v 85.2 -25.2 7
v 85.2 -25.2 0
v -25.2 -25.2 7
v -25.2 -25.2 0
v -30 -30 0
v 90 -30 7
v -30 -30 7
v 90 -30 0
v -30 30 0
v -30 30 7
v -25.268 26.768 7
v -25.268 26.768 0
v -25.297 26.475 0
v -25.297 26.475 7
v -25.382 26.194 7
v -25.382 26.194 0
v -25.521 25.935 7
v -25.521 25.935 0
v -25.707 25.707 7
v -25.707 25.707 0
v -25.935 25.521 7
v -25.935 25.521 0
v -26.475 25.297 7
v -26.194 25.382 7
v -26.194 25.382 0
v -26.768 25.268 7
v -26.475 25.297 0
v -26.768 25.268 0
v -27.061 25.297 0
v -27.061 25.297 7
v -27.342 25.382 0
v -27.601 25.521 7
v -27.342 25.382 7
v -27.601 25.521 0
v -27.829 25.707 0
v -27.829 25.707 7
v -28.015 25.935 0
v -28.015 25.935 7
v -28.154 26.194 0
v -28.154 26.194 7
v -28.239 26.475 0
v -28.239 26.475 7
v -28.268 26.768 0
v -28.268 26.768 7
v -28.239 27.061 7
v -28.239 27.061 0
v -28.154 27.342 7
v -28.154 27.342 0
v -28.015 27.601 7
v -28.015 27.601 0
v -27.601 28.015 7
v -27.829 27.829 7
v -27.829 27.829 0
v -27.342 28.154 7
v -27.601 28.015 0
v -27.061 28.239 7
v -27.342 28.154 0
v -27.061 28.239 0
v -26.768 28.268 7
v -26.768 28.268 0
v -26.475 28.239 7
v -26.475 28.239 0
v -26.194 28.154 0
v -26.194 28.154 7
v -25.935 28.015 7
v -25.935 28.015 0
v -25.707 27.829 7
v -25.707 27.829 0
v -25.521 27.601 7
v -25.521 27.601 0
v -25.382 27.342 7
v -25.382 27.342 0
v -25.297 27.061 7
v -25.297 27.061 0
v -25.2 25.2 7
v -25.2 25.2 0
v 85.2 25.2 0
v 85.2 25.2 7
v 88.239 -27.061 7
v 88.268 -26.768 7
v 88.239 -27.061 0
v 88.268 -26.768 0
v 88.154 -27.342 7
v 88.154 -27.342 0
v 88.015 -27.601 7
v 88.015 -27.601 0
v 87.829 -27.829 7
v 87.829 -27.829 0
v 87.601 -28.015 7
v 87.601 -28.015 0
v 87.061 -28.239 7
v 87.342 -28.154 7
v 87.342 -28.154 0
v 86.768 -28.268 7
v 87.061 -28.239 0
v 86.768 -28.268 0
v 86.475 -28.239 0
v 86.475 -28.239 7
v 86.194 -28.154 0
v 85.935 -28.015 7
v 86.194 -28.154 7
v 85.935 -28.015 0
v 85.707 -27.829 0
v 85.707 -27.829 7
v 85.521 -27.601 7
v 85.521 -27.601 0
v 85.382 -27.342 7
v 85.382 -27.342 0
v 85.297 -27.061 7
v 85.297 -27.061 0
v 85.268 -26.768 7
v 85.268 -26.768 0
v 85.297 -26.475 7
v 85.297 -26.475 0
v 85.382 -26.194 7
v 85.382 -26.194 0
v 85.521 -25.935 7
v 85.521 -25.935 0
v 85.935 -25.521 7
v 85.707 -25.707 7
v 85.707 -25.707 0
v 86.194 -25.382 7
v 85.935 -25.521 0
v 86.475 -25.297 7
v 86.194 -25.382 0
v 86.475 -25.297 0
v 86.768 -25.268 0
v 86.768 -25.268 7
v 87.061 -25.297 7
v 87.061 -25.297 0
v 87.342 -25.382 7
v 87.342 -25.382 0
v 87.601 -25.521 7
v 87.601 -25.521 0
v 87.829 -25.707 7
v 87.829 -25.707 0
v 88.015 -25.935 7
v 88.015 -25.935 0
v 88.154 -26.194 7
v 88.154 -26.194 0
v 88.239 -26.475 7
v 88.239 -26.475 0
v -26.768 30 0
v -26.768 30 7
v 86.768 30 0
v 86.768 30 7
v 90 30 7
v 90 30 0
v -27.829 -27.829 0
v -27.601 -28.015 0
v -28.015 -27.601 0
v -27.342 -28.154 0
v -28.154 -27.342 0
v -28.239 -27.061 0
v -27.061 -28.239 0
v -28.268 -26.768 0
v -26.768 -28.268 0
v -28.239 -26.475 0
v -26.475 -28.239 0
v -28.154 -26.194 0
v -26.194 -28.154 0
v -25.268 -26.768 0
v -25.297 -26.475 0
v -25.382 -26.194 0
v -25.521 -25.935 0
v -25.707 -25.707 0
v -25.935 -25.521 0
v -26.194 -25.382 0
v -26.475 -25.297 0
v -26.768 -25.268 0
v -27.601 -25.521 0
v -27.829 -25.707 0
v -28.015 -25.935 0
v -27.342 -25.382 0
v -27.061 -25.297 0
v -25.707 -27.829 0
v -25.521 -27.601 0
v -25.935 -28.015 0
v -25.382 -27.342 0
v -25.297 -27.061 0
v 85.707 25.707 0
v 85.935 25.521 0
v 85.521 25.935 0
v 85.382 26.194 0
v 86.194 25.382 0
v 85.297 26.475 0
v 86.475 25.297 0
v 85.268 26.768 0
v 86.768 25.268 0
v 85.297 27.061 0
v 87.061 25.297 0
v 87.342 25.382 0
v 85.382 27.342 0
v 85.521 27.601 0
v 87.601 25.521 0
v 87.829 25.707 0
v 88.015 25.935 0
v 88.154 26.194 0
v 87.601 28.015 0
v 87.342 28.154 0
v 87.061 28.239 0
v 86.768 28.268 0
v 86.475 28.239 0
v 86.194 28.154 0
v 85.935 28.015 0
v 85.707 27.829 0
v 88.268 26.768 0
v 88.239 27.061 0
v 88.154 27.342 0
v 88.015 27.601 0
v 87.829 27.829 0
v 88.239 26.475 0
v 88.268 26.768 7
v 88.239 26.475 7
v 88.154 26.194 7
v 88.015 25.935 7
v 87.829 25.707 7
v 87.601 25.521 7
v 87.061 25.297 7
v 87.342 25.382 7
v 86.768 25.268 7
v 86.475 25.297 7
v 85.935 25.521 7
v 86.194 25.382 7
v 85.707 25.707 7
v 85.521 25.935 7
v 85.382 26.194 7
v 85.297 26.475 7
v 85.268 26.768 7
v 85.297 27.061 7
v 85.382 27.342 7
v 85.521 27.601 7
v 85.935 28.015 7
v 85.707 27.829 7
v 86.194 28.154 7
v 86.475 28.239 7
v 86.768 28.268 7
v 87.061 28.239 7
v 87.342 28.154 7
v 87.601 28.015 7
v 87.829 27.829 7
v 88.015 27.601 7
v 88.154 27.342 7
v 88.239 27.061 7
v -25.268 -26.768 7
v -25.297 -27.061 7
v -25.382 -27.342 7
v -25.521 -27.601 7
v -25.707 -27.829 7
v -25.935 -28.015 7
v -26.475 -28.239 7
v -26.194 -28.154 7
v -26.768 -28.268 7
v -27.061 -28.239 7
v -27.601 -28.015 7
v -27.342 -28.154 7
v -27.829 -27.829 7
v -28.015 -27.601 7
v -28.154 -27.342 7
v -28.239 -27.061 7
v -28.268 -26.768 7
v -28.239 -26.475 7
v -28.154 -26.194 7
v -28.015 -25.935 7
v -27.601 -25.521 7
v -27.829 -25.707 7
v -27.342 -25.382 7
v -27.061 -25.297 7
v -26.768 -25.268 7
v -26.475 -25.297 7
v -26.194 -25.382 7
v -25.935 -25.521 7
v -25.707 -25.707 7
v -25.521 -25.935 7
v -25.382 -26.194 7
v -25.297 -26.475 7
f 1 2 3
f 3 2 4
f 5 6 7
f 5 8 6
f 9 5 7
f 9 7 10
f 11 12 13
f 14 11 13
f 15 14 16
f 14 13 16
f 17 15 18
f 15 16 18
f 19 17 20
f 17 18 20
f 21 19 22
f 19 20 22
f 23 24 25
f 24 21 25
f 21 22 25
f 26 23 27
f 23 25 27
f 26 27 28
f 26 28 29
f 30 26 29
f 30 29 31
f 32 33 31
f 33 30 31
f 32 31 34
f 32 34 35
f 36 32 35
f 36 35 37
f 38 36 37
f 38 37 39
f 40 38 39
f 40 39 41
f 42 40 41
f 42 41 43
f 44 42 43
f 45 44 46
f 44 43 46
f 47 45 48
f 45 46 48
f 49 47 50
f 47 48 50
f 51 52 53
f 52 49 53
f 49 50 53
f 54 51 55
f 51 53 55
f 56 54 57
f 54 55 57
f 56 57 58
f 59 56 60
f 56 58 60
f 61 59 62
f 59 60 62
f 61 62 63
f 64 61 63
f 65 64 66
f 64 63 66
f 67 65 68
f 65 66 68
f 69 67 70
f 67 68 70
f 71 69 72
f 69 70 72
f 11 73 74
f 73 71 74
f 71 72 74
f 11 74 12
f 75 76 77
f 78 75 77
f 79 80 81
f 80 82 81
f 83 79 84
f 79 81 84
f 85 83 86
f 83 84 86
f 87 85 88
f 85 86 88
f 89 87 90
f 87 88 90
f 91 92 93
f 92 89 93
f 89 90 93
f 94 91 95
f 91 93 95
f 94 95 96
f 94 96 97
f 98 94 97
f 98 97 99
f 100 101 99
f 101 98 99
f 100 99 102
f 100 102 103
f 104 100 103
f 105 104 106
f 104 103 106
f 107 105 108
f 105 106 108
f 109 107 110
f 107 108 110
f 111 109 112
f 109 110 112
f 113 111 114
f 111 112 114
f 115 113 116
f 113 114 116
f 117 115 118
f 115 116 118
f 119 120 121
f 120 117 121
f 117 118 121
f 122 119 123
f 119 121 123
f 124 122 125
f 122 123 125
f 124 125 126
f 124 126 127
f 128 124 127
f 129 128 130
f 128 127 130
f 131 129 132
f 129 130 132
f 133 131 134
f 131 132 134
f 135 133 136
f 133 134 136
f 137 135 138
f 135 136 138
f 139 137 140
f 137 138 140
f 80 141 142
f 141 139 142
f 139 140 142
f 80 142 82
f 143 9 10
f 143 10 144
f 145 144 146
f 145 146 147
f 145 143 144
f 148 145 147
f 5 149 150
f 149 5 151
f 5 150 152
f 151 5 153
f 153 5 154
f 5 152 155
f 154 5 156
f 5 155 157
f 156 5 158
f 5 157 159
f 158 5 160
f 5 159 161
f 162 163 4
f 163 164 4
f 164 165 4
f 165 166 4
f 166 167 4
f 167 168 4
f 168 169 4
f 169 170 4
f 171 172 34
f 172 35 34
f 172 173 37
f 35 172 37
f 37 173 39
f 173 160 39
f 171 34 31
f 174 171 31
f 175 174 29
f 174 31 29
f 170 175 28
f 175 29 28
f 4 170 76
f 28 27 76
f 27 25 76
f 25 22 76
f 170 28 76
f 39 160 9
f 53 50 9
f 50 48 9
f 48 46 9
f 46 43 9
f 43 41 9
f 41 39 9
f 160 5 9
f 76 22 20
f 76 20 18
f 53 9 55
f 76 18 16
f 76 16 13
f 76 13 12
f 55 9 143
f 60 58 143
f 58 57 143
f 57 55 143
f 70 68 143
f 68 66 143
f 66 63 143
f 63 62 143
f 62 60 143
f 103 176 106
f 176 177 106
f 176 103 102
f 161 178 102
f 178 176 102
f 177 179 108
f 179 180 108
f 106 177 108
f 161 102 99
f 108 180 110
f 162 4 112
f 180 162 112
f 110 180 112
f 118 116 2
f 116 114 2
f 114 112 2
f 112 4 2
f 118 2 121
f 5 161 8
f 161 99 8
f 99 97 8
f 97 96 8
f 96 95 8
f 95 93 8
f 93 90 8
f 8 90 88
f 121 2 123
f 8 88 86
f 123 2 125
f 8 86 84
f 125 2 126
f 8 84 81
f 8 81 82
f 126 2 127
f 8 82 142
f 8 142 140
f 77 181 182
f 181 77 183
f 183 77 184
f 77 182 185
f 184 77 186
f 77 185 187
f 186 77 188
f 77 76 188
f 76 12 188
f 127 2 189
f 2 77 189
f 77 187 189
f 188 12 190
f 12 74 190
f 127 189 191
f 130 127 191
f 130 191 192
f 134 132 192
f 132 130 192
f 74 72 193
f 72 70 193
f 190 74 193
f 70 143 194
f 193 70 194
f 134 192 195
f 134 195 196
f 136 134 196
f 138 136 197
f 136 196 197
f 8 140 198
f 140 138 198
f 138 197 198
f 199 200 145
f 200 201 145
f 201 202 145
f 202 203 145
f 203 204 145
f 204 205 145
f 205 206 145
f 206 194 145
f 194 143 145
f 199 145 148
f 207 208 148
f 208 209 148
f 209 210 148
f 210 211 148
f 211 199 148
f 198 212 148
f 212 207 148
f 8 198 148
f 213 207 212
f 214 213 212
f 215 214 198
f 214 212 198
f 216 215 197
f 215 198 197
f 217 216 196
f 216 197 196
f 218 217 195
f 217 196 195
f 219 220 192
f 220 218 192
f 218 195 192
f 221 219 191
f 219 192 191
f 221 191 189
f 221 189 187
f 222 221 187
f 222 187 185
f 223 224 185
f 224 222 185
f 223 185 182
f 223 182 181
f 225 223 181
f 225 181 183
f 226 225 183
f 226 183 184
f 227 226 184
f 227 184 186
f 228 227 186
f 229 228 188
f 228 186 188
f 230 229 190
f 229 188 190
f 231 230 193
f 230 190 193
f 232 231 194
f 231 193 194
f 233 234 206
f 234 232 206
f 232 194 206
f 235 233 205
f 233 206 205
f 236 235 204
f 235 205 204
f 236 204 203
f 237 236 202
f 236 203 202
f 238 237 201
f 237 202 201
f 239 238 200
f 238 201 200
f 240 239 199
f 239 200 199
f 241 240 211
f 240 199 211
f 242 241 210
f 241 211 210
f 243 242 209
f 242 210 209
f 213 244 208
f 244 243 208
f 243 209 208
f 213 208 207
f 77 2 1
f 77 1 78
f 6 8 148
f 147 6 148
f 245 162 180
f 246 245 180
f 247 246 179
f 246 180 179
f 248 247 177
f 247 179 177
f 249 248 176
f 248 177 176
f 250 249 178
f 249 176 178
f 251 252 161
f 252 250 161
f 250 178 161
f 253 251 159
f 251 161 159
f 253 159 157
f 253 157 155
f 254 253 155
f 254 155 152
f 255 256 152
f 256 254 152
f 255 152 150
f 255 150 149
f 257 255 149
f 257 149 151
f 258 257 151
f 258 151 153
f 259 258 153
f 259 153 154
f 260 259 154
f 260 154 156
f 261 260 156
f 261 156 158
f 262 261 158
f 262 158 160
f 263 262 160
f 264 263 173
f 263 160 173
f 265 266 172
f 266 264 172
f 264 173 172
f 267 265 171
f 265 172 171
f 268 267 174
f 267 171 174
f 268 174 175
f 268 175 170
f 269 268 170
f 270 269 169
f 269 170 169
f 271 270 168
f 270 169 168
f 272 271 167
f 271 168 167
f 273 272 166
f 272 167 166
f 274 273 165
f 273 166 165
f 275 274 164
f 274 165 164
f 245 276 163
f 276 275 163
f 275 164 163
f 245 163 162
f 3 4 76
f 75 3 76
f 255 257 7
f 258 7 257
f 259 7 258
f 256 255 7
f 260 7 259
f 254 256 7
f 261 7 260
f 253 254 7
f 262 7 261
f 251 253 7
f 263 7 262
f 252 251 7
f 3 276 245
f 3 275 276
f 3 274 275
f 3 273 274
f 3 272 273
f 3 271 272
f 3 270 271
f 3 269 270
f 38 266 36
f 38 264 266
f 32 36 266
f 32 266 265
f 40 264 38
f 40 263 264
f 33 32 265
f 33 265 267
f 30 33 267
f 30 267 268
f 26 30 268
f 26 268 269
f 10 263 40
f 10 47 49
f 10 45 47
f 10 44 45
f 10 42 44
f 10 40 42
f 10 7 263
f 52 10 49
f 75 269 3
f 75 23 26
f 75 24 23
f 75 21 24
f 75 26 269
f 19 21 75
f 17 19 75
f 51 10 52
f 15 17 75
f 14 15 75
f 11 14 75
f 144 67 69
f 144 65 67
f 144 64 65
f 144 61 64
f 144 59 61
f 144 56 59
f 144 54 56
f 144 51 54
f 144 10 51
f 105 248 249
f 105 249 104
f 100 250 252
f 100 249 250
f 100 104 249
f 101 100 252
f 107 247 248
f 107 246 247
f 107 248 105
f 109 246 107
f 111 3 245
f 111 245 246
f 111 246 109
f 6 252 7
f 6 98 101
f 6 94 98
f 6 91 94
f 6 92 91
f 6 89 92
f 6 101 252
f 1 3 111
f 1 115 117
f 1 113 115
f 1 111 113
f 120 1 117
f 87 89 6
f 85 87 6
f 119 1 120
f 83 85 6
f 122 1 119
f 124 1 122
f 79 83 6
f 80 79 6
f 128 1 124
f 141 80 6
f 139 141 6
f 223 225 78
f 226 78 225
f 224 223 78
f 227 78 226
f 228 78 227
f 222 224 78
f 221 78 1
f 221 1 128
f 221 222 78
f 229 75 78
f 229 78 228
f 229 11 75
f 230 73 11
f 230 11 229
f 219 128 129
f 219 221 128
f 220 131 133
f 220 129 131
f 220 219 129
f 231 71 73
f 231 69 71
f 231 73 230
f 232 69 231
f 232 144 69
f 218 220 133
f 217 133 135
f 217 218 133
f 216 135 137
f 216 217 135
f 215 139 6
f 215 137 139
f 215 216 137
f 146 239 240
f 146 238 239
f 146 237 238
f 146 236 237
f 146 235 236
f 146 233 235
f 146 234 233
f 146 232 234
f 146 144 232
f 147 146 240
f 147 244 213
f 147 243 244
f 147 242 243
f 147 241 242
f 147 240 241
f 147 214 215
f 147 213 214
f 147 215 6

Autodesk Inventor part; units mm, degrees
ref_plane "YZ Plane" through (0, 0, 0) normal (1, 0, 0) x (0, 1, 0)
ref_plane "XZ Plane" through (0, 0, 0) normal (0, 1, 0) x (-1, 0, 0)
ref_plane "XY Plane" through (0, 0, 0) normal (0, 0, 1) x (1, 0, 0)
sketch "Sketch1" plane through (0, 0, 0) normal (0, 0, 1) x (1, 0, 0)
  line L0 (-25.2, 25.2) -> (25.2, 25.2)
  line L1 (25.2, 25.2) -> (25.2, -25.2)
  line L2 (25.2, -25.2) -> (-25.2, -25.2)
  line L3 (-25.2, -25.2) -> (-25.2, 25.2)
  line L4 (-25.2, 25.2) -> (25.2, -25.2) construction
  line L5 (25.2, 25.2) -> (-25.2, -25.2) construction
  line L6 (-30, 30) -> (30, 30)
  line L7 (30, 30) -> (30, -30)
  line L8 (30, -30) -> (-30, -30)
  line L9 (-30, -30) -> (-30, 30)
  line L10 (-30, 30) -> (30, -30) construction
  line L11 (30, 30) -> (-30, -30) construction
  line L12 (-30, 30) -> (-26.768, 30)
  line L13 (-26.768, 30) -> (-26.768, 26.768)
  circle A0 centre (-26.768, 26.768) radius 1.5
  circle A1 centre (-26.768, -26.768) radius 1.5
  circle A2 centre (26.768, -26.768) radius 1.5
  circle A3 centre (26.768, 26.768) radius 1.5
  line L14 (85.2, 25.2) -> (34.8, 25.2)
  line L15 (34.8, 25.2) -> (34.8, -25.2)
  line L16 (34.8, -25.2) -> (85.2, -25.2)
  line L17 (85.2, -25.2) -> (85.2, 25.2)
  line L18 (85.2, 25.2) -> (34.8, -25.2) construction
  line L19 (34.8, 25.2) -> (85.2, -25.2) construction
  line L20 (90, 30) -> (30, 30)
  line L21 (30, -30) -> (90, -30)
  line L22 (90, -30) -> (90, 30)
  line L23 (90, 30) -> (30, -30) construction
  line L24 (30, 30) -> (90, -30) construction
  line L25 (90, 30) -> (86.768, 30)
  line L26 (86.768, 30) -> (86.768, 26.768)
  circle A4 centre (86.768, 26.768) radius 1.5
  circle A5 centre (86.768, -26.768) radius 1.5
  line L27 (25.2, 25.2) -> (34.8, 25.2)
  line L28 (25.2, -25.2) -> (34.8, -25.2)
  point P0 (0, 0)
  point P1 (60, 0)
  dimension "d0" = 50.4
  dimension "d1" = 50.4
  dimension "d2" = 60
  dimension "d3" = 60
  dimension "d4" = 3.232
  dimension "d5" = 3.232
  dimension "d6" = 3
  dimension "d9" = 360
extrude "Extrusion1" add sketch "Sketch1" along normal blind 7 contours L3 L2 L28 L7 L8 L9 L6 L27 L0 | L7 L20 L22 L21 L28 L16 L17 L14 L27 | A2 | A3
properties part number "rack_C2x1"
